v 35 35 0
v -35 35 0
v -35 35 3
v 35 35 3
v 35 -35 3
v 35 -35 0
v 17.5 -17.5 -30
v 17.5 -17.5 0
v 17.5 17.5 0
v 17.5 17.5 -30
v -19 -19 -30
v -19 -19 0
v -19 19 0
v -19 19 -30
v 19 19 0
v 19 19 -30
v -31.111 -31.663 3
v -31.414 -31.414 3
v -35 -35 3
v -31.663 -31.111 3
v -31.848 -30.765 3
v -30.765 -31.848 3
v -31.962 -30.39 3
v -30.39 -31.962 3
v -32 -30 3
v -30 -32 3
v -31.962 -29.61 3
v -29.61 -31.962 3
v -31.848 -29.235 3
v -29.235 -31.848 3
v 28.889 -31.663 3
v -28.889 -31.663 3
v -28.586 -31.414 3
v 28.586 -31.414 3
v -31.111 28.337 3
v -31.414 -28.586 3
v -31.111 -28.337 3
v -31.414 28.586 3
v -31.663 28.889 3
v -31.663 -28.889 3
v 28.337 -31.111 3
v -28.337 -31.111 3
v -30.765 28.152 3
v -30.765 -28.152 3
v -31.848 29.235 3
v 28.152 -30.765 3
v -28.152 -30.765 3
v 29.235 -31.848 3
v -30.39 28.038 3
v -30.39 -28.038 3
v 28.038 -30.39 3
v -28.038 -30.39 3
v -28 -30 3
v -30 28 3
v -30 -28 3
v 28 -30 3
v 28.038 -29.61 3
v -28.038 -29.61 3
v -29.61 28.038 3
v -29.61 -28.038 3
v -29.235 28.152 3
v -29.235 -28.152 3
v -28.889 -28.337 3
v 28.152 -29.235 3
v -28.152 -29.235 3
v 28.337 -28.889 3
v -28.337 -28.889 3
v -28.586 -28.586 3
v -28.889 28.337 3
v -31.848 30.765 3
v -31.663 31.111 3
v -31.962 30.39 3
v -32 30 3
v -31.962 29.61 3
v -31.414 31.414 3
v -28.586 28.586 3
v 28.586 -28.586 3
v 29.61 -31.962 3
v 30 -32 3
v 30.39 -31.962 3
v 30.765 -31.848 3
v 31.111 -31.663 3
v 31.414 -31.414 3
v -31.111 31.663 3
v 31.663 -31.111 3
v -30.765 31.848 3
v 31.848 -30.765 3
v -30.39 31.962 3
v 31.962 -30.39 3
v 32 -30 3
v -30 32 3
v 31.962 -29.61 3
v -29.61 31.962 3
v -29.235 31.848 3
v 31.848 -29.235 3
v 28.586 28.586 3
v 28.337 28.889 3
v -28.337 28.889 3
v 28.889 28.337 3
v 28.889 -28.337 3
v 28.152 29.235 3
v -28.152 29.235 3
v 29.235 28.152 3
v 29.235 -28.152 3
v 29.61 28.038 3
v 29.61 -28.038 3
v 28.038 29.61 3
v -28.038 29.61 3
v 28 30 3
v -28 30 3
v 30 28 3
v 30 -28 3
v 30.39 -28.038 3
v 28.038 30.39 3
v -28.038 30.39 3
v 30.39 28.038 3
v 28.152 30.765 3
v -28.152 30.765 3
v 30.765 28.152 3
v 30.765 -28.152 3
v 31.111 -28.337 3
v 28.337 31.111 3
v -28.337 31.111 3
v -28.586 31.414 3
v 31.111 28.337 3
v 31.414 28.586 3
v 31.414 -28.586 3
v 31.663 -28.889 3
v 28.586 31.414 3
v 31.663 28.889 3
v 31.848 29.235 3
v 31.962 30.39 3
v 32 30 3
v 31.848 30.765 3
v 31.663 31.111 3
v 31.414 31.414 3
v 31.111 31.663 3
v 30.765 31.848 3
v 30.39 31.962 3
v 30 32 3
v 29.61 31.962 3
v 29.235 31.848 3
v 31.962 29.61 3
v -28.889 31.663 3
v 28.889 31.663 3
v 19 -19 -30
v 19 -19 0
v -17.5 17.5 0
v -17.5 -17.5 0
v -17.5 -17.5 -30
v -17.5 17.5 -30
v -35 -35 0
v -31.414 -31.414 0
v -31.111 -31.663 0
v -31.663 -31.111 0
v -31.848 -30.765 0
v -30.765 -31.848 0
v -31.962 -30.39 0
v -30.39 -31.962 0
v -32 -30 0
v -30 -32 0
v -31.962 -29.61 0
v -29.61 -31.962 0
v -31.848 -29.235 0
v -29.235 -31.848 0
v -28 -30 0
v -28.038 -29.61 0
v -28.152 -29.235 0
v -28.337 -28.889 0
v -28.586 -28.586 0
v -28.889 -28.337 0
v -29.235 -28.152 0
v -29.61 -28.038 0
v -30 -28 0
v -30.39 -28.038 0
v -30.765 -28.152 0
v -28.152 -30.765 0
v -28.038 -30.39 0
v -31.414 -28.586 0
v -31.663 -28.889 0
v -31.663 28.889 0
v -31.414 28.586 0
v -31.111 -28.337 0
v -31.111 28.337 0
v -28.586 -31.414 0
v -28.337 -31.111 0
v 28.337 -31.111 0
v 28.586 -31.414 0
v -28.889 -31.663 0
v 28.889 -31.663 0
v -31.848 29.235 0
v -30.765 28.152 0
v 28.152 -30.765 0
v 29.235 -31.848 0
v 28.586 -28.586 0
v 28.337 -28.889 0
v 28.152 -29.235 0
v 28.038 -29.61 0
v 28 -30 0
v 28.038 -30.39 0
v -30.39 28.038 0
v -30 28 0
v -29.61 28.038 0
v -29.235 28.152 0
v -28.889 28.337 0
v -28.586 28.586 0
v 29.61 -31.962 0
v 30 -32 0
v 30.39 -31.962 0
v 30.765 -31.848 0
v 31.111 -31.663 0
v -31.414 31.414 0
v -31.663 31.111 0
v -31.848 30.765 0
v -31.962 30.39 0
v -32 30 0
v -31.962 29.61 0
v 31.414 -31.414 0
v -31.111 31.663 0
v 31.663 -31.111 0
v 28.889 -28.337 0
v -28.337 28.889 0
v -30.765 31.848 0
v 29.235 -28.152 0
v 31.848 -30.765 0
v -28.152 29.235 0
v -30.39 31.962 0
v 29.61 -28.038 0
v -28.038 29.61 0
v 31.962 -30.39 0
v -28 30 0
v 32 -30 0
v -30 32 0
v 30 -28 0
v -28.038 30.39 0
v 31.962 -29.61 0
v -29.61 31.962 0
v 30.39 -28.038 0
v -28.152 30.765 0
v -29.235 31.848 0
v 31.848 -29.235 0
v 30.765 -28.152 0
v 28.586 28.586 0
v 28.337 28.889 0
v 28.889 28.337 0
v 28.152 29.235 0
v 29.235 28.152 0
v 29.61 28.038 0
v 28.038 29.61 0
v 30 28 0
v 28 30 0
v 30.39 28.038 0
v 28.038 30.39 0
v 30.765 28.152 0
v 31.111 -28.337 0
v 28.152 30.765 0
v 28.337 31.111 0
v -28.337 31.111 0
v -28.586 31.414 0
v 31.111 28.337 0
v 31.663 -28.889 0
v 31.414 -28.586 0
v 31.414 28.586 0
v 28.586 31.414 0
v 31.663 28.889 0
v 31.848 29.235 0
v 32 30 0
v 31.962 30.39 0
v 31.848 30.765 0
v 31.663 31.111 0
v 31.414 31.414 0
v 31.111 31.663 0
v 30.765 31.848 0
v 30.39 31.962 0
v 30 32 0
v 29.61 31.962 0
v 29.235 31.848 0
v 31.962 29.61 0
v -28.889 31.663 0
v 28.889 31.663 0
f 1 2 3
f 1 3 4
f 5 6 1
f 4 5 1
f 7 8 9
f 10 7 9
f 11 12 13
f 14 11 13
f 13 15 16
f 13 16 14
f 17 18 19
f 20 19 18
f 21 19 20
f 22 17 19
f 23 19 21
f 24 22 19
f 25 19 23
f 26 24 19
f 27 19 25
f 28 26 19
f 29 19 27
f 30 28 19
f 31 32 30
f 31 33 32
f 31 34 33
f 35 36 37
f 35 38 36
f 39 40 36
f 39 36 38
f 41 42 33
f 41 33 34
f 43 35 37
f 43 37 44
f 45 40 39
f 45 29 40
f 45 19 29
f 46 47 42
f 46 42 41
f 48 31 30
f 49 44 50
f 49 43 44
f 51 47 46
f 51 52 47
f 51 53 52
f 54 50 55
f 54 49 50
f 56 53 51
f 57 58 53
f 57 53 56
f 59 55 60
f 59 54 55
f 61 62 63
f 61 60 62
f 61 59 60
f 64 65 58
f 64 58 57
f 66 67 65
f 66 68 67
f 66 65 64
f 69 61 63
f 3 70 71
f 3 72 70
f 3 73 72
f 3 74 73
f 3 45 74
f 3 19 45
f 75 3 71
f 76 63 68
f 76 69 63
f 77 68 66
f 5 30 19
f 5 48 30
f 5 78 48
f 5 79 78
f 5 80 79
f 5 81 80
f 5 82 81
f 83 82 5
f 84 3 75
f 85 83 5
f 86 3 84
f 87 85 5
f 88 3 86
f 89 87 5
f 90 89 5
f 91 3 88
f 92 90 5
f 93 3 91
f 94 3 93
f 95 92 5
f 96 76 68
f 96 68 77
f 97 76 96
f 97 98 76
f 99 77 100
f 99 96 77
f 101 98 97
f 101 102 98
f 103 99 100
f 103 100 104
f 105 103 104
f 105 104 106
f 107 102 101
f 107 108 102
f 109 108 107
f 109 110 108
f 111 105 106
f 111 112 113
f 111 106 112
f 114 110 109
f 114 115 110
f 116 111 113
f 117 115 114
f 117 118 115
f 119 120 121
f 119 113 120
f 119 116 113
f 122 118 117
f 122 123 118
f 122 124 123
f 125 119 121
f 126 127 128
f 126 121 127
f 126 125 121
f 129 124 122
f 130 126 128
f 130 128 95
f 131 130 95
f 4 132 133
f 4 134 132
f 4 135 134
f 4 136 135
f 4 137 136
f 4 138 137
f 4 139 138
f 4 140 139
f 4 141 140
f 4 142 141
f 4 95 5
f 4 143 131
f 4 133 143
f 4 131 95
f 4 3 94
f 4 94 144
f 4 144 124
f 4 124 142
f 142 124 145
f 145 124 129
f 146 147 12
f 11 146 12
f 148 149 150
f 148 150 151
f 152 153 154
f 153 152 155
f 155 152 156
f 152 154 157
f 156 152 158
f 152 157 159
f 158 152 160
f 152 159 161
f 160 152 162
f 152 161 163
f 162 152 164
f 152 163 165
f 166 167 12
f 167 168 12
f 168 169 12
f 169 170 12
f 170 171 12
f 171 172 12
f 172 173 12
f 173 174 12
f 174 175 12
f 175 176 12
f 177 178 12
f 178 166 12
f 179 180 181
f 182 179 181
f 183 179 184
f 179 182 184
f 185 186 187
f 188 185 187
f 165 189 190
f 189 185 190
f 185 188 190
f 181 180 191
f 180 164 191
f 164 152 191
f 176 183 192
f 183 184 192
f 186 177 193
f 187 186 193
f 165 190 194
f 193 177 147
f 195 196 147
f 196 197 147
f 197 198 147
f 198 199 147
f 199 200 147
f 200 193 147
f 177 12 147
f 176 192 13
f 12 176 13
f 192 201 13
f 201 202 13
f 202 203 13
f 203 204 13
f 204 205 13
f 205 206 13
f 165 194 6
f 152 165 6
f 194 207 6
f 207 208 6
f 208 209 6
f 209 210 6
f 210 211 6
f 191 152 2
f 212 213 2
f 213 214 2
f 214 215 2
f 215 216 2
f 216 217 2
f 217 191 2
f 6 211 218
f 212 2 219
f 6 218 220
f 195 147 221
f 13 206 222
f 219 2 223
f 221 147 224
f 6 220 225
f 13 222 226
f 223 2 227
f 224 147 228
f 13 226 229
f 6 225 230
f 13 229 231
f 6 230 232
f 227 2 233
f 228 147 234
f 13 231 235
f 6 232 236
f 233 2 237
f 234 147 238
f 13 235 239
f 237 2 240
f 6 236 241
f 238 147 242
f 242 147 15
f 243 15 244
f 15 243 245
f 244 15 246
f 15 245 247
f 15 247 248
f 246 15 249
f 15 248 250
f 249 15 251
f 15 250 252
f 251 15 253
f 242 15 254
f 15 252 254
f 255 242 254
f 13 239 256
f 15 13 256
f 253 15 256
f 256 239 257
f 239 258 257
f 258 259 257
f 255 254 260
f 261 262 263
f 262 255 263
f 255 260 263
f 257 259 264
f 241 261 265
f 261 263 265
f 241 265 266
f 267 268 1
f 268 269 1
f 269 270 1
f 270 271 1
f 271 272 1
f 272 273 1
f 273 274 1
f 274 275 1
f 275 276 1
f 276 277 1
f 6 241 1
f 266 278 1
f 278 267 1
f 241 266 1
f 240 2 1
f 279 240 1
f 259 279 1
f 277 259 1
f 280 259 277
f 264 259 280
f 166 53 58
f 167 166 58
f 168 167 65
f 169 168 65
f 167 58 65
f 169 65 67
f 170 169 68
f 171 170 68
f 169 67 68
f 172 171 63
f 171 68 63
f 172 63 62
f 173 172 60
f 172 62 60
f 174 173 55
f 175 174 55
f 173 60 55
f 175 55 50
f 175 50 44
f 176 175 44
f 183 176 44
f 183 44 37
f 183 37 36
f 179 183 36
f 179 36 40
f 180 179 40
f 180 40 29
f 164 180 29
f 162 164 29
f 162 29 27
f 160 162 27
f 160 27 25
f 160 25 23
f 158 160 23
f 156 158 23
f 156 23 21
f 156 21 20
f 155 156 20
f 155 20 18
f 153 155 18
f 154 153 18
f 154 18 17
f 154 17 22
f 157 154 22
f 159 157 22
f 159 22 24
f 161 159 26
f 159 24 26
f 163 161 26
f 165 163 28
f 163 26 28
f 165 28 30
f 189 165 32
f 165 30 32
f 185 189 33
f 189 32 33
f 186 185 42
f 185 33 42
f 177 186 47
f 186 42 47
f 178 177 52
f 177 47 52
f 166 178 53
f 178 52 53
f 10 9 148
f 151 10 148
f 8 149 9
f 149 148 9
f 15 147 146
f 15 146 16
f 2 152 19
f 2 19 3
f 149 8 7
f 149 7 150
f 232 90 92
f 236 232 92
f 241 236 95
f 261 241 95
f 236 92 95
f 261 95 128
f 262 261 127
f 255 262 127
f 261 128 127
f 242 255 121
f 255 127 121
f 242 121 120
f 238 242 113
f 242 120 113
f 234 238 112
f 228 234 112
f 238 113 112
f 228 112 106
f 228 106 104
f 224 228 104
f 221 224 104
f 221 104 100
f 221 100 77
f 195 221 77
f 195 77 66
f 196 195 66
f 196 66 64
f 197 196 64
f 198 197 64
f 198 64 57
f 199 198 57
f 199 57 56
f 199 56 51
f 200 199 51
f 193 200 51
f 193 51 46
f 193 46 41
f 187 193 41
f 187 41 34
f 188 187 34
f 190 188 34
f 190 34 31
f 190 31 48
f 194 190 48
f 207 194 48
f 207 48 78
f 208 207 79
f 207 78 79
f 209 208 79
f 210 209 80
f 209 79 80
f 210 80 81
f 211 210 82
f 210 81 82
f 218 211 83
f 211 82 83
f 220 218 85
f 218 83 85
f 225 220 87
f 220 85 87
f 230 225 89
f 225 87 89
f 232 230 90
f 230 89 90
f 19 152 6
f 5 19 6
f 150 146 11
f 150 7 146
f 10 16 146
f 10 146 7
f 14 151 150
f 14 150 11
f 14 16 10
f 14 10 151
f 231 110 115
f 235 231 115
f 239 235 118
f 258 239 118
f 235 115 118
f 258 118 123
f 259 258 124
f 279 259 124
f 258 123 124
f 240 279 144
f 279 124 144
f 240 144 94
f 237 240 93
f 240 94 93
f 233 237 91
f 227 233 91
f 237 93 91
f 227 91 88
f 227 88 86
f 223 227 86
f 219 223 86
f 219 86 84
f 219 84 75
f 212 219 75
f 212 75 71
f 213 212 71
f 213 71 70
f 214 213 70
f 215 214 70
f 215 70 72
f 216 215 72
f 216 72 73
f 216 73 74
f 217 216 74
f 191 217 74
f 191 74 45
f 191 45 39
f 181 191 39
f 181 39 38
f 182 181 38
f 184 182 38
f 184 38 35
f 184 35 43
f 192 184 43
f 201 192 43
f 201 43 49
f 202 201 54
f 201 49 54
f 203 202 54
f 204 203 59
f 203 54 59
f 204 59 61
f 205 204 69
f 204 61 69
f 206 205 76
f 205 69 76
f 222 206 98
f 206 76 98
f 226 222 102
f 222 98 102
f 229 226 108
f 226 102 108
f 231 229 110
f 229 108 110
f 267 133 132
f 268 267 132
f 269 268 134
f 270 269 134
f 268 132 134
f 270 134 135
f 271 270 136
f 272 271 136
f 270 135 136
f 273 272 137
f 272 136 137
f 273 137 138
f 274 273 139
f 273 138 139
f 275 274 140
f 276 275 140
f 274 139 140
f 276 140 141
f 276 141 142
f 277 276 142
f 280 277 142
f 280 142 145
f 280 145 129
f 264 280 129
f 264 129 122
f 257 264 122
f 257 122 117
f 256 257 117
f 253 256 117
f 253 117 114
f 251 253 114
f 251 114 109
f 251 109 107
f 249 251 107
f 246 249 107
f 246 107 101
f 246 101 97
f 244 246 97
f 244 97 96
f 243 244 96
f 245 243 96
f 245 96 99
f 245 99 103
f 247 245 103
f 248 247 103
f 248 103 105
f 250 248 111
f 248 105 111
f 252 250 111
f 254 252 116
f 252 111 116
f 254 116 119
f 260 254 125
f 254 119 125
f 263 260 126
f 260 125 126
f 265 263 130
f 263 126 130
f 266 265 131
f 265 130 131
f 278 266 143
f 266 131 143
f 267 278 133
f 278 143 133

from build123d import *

# Parameters (mm, degrees)
SKETCH1_W           = 70
SKETCH1_H           = 70
BOSS_EXTRUDE1_DEPTH = 3
SKETCH3_R           = 2
CUT_EXTRUDE1_DEPTH  = 4
SKETCH5_W           = 38
SKETCH5_H           = 38
SKETCH5_W_2         = 35
SKETCH5_H_2         = 35
BOSS_EXTRUDE2_DEPTH = 30


with BuildPart() as part:
    # Sketch1 → Boss-Extrude1 (new body)
    with BuildSketch(Plane.XY):
        Rectangle(SKETCH1_W, SKETCH1_H)
    extrude(amount=BOSS_EXTRUDE1_DEPTH)

    # Sketch3 → Cut-Extrude1 (cut)
    with BuildSketch(Plane.XY.offset(3)):
        with Locations((-30, 30)):
            Circle(SKETCH3_R)
        with Locations((30, 30)):
            Circle(SKETCH3_R)
        with Locations((30, -30)):
            Circle(SKETCH3_R)
        with Locations((-30, -30)):
            Circle(SKETCH3_R)
    extrude(amount=-CUT_EXTRUDE1_DEPTH, mode=Mode.SUBTRACT)

    # Sketch5 → Boss-Extrude2 (add)
    with BuildSketch(Plane(origin=(0, 0, 0), x_dir=(-1, 0, 0), z_dir=(0, 0, -1))):
        Rectangle(SKETCH5_W, SKETCH5_H)
        Rectangle(SKETCH5_W_2, SKETCH5_H_2, mode=Mode.SUBTRACT)
    extrude(amount=BOSS_EXTRUDE2_DEPTH)


solid = part.part
